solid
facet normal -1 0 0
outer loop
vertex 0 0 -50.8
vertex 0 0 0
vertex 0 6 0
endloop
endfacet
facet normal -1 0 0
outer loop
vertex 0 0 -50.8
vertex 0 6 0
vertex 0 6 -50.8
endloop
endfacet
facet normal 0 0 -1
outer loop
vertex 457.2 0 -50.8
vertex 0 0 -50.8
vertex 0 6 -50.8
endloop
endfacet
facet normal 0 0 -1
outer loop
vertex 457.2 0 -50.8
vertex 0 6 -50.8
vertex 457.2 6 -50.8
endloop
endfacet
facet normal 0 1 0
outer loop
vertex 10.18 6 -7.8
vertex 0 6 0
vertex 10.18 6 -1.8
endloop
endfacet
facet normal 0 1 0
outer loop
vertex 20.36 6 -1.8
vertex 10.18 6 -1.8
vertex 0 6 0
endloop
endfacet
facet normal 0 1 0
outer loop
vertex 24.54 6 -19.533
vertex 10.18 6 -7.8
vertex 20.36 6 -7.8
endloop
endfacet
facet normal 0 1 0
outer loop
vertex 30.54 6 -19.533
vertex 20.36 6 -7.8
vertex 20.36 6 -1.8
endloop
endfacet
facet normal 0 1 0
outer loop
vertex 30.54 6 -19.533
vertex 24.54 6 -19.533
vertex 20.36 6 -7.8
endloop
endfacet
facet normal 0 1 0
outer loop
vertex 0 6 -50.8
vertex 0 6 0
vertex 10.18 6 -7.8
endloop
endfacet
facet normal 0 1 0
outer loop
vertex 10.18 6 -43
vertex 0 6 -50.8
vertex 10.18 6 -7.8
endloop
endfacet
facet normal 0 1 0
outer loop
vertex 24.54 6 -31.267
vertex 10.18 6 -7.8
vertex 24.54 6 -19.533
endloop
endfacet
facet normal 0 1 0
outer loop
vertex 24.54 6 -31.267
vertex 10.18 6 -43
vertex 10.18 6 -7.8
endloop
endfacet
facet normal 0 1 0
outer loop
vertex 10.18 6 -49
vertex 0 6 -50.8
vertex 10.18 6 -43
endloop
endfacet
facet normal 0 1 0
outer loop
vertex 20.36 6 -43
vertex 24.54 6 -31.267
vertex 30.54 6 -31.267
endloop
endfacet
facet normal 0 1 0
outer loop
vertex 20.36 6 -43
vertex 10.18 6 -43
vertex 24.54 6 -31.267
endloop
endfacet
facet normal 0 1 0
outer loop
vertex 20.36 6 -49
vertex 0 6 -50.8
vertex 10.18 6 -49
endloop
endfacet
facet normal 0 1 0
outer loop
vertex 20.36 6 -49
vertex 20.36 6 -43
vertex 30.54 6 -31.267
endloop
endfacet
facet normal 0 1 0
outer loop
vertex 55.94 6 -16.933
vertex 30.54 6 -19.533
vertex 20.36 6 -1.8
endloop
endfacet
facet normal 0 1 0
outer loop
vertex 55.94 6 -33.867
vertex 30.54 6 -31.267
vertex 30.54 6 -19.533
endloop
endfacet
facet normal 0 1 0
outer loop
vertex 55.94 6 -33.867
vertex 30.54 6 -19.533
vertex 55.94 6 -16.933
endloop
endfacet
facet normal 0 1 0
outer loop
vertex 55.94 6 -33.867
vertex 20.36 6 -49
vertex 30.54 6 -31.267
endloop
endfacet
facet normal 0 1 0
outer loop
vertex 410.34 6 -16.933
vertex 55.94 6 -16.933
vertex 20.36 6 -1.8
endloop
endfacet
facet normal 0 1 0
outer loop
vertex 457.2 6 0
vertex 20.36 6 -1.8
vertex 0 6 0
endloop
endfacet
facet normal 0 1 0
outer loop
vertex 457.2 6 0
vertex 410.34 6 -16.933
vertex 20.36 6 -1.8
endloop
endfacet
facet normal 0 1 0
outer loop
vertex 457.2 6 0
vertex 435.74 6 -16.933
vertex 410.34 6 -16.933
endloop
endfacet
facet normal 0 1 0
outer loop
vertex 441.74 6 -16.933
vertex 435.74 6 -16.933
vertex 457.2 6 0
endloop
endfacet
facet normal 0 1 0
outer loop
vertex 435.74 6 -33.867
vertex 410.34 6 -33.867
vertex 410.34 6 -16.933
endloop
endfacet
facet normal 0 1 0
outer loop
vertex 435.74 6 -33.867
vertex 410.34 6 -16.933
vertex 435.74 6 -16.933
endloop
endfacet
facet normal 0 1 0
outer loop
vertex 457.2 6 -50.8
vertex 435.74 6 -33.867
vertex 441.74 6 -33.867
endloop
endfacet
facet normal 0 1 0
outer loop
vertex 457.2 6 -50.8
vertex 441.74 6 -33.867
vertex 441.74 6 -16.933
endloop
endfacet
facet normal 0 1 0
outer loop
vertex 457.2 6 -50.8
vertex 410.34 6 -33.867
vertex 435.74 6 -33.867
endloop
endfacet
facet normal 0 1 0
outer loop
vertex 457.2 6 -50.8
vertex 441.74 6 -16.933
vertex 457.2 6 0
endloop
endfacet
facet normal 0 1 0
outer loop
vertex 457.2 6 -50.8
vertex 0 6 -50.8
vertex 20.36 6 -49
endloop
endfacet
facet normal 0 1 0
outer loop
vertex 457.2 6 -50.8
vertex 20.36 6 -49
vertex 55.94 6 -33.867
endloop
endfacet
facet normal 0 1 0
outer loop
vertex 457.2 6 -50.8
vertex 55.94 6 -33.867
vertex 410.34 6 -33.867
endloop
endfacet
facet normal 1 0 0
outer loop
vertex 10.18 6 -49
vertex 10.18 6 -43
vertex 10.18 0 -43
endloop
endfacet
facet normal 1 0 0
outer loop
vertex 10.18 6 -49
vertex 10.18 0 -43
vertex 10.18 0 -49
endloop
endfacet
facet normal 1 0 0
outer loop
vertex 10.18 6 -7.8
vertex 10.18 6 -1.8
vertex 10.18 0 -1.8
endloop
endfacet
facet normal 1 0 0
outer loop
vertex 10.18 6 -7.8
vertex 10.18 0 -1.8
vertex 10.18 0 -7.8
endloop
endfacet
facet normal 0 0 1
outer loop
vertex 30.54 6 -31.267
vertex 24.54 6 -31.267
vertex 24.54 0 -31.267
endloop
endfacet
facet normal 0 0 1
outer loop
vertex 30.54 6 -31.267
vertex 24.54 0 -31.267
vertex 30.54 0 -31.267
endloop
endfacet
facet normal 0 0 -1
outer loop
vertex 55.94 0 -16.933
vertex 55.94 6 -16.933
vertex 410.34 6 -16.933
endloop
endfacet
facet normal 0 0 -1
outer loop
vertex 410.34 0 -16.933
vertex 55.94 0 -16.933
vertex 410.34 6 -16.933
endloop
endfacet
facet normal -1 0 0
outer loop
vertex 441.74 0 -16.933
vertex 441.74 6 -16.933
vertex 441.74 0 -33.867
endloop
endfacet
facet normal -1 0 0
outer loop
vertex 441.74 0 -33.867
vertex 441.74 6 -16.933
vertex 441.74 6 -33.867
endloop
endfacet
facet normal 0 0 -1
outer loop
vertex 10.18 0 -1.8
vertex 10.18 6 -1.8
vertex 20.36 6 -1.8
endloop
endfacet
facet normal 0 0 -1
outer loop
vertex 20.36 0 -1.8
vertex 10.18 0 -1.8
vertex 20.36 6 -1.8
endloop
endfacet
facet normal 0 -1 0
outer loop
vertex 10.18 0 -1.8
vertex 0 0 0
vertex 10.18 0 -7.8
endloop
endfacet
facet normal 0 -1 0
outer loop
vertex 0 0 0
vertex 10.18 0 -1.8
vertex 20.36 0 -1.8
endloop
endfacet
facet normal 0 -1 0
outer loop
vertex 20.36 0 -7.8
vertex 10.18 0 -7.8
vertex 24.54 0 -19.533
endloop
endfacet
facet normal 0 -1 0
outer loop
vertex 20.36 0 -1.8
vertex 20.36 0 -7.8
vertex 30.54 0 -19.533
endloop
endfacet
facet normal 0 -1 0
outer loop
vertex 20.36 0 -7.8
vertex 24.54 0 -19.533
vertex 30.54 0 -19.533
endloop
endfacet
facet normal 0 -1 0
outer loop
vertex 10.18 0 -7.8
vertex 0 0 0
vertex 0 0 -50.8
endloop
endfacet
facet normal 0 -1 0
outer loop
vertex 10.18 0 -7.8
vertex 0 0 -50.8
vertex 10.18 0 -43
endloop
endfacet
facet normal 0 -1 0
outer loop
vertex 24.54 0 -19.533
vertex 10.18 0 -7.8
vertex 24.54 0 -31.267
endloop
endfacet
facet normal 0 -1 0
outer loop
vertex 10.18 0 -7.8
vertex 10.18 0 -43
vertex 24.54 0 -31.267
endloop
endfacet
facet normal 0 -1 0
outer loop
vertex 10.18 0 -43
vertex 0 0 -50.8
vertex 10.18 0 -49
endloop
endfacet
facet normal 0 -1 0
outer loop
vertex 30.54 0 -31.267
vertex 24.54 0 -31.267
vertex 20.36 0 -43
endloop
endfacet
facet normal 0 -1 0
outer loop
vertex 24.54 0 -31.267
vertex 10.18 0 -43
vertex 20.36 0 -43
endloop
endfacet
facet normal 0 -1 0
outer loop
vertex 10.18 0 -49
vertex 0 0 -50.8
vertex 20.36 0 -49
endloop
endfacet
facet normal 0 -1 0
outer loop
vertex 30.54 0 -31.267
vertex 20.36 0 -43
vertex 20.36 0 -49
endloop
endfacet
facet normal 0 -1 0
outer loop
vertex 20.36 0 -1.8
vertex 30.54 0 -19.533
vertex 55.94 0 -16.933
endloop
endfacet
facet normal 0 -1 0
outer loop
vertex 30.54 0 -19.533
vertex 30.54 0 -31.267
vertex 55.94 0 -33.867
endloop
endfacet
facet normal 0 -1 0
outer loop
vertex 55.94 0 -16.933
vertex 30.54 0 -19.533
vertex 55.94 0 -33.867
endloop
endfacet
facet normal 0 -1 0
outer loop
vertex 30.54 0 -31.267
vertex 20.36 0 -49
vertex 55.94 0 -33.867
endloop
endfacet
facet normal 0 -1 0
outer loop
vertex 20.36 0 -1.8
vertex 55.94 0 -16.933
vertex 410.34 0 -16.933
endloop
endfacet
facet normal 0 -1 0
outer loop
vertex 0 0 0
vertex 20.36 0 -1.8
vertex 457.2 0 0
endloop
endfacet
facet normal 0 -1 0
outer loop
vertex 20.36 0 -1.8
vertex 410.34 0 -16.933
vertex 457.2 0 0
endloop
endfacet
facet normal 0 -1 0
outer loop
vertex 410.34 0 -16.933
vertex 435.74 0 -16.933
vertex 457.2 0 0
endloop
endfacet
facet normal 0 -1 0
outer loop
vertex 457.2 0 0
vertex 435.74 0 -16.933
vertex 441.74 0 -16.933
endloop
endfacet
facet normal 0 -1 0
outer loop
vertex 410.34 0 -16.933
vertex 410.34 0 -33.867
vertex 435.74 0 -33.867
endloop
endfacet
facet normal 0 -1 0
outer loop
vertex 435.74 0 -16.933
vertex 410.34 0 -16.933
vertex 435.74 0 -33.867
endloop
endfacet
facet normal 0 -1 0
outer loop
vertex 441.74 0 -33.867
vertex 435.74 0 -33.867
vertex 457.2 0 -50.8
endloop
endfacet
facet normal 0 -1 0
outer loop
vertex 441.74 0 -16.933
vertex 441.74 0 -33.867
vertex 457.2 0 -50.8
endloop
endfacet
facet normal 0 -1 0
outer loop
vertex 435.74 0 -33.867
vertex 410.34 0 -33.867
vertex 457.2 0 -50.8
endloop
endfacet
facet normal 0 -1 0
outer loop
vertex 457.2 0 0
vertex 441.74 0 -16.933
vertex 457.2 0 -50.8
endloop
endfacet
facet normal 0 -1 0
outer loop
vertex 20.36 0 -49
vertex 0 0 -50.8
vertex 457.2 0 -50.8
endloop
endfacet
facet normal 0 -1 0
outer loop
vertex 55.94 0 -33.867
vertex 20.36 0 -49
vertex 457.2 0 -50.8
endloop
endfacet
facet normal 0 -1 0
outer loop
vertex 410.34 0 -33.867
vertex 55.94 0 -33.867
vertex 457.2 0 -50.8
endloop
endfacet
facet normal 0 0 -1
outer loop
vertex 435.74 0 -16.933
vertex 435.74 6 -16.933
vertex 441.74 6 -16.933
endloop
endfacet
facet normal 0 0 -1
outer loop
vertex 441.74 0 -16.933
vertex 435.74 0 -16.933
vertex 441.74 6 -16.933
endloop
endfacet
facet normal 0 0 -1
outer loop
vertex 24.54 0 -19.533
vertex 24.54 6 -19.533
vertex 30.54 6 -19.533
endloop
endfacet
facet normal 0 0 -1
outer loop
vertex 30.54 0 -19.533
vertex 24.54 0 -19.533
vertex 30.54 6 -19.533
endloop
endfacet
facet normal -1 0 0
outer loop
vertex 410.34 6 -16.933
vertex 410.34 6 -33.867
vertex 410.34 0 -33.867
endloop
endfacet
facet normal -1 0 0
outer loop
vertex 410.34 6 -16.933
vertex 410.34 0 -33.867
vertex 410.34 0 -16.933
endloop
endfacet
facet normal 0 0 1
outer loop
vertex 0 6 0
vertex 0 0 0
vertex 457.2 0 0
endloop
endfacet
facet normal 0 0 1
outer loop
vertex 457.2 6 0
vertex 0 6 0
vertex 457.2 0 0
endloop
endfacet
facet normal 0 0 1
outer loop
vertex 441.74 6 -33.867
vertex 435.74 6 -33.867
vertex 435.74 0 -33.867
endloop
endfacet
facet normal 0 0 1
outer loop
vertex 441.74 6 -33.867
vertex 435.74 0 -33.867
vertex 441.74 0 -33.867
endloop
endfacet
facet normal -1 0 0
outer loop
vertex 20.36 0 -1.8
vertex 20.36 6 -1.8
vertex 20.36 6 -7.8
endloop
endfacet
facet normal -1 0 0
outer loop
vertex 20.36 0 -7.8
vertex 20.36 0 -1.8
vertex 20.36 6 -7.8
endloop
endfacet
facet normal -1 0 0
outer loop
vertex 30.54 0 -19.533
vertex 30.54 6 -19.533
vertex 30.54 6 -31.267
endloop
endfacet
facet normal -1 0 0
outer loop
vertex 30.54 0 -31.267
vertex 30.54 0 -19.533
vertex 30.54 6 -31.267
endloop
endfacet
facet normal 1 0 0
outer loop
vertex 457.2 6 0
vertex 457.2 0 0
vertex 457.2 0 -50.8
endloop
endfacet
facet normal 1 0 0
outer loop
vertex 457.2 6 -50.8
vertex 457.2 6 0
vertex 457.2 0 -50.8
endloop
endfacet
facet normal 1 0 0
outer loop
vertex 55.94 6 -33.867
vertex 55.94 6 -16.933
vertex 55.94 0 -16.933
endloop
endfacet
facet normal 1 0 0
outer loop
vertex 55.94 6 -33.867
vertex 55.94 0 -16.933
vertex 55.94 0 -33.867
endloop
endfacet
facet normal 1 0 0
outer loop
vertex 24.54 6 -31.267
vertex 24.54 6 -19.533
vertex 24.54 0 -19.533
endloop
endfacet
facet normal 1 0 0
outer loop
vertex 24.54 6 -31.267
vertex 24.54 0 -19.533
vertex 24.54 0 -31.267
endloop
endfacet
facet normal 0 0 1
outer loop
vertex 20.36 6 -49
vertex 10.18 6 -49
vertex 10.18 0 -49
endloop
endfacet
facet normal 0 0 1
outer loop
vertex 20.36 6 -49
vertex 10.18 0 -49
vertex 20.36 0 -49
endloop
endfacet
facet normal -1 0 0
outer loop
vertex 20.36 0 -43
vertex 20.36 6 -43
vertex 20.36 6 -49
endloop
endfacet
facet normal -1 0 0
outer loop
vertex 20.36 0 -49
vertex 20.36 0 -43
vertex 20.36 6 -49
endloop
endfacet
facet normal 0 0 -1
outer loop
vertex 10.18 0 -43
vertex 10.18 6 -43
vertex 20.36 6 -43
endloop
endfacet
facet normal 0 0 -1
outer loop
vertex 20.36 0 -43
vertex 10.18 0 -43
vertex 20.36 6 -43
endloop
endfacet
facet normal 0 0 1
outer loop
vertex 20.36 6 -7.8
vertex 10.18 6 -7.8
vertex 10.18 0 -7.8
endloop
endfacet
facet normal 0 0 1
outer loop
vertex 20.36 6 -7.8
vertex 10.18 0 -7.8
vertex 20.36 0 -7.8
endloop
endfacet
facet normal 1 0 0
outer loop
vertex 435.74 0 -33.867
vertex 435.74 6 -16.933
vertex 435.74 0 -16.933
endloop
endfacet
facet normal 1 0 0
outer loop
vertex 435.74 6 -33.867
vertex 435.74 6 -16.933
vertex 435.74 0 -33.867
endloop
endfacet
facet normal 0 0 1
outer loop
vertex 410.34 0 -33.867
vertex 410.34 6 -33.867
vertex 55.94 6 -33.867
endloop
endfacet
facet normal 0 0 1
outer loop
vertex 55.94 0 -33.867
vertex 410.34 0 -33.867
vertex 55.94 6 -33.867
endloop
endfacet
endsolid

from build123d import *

# Parameters (mm, degrees)
SKETCH2_W          = 457.2
SKETCH2_H          = 50.8
BASE_DEPTH         = 6
CUT_EXTRUDE1_REACH = 8
SKETCH3_W          = 6
SKETCH3_H          = 16.933333334
SKETCH3_H_2        = 11.733333334
CUT_EXTRUDE2_REACH = 8
SKETCH4_W          = 10.18
SKETCH4_H          = 6
CUT_EXTRUDE3_REACH = 8


with BuildPart() as part:
    # Sketch2 → Base (new body)
    with BuildSketch(Plane(origin=(0, 0, 0), x_dir=(1, 0, 0), z_dir=(0, 1, 0))):
        with Locations((228.6, 25.4)):
            Rectangle(SKETCH2_W, SKETCH2_H)
    extrude(amount=BASE_DEPTH)

    # Sketch3 → Cut-Extrude1 (cut, up to next)
    with BuildSketch(Plane(origin=(0, 6, 0), x_dir=(1, 0, 0), z_dir=(0, 1, 0)), mode=Mode.PRIVATE) as cut_extrude1_sk1:
        with Locations((438.74, 25.4)):
            Rectangle(SKETCH3_W, SKETCH3_H)
    cut_extrude1_tool1 = extrude(cut_extrude1_sk1.sketch, amount=-CUT_EXTRUDE1_REACH, mode=Mode.PRIVATE) & part.part
    add(cut_extrude1_tool1.solids().sort_by_distance((438.74, 6, -25.4))[0], mode=Mode.SUBTRACT)
    # Sketch3 → Cut-Extrude1 (cut, up to next)
    with BuildSketch(Plane(origin=(0, 6, 0), x_dir=(1, 0, 0), z_dir=(0, 1, 0)), mode=Mode.PRIVATE) as cut_extrude1_sk2:
        with Locations((27.54, 25.4)):
            Rectangle(SKETCH3_W, SKETCH3_H_2)
    cut_extrude1_tool2 = extrude(cut_extrude1_sk2.sketch, amount=-CUT_EXTRUDE1_REACH, mode=Mode.PRIVATE) & part.part
    add(cut_extrude1_tool2.solids().sort_by_distance((27.54, 6, -25.4))[0], mode=Mode.SUBTRACT)

    # Sketch4 → Cut-Extrude2 (cut, up to next)
    with BuildSketch(Plane(origin=(0, 6, 0), x_dir=(1, 0, 0), z_dir=(0, 1, 0)), mode=Mode.PRIVATE) as cut_extrude2_sk1:
        with Locations((15.27, 4.8)):
            Rectangle(SKETCH4_W, SKETCH4_H)
    cut_extrude2_tool1 = extrude(cut_extrude2_sk1.sketch, amount=-CUT_EXTRUDE2_REACH, mode=Mode.PRIVATE) & part.part
    add(cut_extrude2_tool1.solids().sort_by_distance((15.27, 6, -4.8))[0], mode=Mode.SUBTRACT)
    # Sketch4 → Cut-Extrude2 (cut, up to next)
    with BuildSketch(Plane(origin=(0, 6, 0), x_dir=(1, 0, 0), z_dir=(0, 1, 0)), mode=Mode.PRIVATE) as cut_extrude2_sk2:
        with Locations((15.27, 46)):
            Rectangle(SKETCH4_W, SKETCH4_H)
    cut_extrude2_tool2 = extrude(cut_extrude2_sk2.sketch, amount=-CUT_EXTRUDE2_REACH, mode=Mode.PRIVATE) & part.part
    add(cut_extrude2_tool2.solids().sort_by_distance((15.27, 6, -46))[0], mode=Mode.SUBTRACT)

    # Sketch5 → Cut-Extrude3 (cut, up to next)
    with BuildSketch(Plane(origin=(0, 6, 0), x_dir=(1, 0, 0), z_dir=(0, 1, 0)), mode=Mode.PRIVATE) as cut_extrude3_sk1:
        Polygon((214.894666784, 33.866666667), (242.305333216, 33.866666667), (410.34, 33.866666667), (410.34, 16.933333333), (242.305333216, 16.933333333), (214.894666784, 16.933333333), (55.94, 16.933333333), (55.94, 33.866666667), align=None)
    cut_extrude3_tool1 = extrude(cut_extrude3_sk1.sketch, amount=-CUT_EXTRUDE3_REACH, mode=Mode.PRIVATE) & part.part
    add(cut_extrude3_tool1.solids().sort_by_distance((233.14, 6, -25.4))[0], mode=Mode.SUBTRACT)


solid = part.part
